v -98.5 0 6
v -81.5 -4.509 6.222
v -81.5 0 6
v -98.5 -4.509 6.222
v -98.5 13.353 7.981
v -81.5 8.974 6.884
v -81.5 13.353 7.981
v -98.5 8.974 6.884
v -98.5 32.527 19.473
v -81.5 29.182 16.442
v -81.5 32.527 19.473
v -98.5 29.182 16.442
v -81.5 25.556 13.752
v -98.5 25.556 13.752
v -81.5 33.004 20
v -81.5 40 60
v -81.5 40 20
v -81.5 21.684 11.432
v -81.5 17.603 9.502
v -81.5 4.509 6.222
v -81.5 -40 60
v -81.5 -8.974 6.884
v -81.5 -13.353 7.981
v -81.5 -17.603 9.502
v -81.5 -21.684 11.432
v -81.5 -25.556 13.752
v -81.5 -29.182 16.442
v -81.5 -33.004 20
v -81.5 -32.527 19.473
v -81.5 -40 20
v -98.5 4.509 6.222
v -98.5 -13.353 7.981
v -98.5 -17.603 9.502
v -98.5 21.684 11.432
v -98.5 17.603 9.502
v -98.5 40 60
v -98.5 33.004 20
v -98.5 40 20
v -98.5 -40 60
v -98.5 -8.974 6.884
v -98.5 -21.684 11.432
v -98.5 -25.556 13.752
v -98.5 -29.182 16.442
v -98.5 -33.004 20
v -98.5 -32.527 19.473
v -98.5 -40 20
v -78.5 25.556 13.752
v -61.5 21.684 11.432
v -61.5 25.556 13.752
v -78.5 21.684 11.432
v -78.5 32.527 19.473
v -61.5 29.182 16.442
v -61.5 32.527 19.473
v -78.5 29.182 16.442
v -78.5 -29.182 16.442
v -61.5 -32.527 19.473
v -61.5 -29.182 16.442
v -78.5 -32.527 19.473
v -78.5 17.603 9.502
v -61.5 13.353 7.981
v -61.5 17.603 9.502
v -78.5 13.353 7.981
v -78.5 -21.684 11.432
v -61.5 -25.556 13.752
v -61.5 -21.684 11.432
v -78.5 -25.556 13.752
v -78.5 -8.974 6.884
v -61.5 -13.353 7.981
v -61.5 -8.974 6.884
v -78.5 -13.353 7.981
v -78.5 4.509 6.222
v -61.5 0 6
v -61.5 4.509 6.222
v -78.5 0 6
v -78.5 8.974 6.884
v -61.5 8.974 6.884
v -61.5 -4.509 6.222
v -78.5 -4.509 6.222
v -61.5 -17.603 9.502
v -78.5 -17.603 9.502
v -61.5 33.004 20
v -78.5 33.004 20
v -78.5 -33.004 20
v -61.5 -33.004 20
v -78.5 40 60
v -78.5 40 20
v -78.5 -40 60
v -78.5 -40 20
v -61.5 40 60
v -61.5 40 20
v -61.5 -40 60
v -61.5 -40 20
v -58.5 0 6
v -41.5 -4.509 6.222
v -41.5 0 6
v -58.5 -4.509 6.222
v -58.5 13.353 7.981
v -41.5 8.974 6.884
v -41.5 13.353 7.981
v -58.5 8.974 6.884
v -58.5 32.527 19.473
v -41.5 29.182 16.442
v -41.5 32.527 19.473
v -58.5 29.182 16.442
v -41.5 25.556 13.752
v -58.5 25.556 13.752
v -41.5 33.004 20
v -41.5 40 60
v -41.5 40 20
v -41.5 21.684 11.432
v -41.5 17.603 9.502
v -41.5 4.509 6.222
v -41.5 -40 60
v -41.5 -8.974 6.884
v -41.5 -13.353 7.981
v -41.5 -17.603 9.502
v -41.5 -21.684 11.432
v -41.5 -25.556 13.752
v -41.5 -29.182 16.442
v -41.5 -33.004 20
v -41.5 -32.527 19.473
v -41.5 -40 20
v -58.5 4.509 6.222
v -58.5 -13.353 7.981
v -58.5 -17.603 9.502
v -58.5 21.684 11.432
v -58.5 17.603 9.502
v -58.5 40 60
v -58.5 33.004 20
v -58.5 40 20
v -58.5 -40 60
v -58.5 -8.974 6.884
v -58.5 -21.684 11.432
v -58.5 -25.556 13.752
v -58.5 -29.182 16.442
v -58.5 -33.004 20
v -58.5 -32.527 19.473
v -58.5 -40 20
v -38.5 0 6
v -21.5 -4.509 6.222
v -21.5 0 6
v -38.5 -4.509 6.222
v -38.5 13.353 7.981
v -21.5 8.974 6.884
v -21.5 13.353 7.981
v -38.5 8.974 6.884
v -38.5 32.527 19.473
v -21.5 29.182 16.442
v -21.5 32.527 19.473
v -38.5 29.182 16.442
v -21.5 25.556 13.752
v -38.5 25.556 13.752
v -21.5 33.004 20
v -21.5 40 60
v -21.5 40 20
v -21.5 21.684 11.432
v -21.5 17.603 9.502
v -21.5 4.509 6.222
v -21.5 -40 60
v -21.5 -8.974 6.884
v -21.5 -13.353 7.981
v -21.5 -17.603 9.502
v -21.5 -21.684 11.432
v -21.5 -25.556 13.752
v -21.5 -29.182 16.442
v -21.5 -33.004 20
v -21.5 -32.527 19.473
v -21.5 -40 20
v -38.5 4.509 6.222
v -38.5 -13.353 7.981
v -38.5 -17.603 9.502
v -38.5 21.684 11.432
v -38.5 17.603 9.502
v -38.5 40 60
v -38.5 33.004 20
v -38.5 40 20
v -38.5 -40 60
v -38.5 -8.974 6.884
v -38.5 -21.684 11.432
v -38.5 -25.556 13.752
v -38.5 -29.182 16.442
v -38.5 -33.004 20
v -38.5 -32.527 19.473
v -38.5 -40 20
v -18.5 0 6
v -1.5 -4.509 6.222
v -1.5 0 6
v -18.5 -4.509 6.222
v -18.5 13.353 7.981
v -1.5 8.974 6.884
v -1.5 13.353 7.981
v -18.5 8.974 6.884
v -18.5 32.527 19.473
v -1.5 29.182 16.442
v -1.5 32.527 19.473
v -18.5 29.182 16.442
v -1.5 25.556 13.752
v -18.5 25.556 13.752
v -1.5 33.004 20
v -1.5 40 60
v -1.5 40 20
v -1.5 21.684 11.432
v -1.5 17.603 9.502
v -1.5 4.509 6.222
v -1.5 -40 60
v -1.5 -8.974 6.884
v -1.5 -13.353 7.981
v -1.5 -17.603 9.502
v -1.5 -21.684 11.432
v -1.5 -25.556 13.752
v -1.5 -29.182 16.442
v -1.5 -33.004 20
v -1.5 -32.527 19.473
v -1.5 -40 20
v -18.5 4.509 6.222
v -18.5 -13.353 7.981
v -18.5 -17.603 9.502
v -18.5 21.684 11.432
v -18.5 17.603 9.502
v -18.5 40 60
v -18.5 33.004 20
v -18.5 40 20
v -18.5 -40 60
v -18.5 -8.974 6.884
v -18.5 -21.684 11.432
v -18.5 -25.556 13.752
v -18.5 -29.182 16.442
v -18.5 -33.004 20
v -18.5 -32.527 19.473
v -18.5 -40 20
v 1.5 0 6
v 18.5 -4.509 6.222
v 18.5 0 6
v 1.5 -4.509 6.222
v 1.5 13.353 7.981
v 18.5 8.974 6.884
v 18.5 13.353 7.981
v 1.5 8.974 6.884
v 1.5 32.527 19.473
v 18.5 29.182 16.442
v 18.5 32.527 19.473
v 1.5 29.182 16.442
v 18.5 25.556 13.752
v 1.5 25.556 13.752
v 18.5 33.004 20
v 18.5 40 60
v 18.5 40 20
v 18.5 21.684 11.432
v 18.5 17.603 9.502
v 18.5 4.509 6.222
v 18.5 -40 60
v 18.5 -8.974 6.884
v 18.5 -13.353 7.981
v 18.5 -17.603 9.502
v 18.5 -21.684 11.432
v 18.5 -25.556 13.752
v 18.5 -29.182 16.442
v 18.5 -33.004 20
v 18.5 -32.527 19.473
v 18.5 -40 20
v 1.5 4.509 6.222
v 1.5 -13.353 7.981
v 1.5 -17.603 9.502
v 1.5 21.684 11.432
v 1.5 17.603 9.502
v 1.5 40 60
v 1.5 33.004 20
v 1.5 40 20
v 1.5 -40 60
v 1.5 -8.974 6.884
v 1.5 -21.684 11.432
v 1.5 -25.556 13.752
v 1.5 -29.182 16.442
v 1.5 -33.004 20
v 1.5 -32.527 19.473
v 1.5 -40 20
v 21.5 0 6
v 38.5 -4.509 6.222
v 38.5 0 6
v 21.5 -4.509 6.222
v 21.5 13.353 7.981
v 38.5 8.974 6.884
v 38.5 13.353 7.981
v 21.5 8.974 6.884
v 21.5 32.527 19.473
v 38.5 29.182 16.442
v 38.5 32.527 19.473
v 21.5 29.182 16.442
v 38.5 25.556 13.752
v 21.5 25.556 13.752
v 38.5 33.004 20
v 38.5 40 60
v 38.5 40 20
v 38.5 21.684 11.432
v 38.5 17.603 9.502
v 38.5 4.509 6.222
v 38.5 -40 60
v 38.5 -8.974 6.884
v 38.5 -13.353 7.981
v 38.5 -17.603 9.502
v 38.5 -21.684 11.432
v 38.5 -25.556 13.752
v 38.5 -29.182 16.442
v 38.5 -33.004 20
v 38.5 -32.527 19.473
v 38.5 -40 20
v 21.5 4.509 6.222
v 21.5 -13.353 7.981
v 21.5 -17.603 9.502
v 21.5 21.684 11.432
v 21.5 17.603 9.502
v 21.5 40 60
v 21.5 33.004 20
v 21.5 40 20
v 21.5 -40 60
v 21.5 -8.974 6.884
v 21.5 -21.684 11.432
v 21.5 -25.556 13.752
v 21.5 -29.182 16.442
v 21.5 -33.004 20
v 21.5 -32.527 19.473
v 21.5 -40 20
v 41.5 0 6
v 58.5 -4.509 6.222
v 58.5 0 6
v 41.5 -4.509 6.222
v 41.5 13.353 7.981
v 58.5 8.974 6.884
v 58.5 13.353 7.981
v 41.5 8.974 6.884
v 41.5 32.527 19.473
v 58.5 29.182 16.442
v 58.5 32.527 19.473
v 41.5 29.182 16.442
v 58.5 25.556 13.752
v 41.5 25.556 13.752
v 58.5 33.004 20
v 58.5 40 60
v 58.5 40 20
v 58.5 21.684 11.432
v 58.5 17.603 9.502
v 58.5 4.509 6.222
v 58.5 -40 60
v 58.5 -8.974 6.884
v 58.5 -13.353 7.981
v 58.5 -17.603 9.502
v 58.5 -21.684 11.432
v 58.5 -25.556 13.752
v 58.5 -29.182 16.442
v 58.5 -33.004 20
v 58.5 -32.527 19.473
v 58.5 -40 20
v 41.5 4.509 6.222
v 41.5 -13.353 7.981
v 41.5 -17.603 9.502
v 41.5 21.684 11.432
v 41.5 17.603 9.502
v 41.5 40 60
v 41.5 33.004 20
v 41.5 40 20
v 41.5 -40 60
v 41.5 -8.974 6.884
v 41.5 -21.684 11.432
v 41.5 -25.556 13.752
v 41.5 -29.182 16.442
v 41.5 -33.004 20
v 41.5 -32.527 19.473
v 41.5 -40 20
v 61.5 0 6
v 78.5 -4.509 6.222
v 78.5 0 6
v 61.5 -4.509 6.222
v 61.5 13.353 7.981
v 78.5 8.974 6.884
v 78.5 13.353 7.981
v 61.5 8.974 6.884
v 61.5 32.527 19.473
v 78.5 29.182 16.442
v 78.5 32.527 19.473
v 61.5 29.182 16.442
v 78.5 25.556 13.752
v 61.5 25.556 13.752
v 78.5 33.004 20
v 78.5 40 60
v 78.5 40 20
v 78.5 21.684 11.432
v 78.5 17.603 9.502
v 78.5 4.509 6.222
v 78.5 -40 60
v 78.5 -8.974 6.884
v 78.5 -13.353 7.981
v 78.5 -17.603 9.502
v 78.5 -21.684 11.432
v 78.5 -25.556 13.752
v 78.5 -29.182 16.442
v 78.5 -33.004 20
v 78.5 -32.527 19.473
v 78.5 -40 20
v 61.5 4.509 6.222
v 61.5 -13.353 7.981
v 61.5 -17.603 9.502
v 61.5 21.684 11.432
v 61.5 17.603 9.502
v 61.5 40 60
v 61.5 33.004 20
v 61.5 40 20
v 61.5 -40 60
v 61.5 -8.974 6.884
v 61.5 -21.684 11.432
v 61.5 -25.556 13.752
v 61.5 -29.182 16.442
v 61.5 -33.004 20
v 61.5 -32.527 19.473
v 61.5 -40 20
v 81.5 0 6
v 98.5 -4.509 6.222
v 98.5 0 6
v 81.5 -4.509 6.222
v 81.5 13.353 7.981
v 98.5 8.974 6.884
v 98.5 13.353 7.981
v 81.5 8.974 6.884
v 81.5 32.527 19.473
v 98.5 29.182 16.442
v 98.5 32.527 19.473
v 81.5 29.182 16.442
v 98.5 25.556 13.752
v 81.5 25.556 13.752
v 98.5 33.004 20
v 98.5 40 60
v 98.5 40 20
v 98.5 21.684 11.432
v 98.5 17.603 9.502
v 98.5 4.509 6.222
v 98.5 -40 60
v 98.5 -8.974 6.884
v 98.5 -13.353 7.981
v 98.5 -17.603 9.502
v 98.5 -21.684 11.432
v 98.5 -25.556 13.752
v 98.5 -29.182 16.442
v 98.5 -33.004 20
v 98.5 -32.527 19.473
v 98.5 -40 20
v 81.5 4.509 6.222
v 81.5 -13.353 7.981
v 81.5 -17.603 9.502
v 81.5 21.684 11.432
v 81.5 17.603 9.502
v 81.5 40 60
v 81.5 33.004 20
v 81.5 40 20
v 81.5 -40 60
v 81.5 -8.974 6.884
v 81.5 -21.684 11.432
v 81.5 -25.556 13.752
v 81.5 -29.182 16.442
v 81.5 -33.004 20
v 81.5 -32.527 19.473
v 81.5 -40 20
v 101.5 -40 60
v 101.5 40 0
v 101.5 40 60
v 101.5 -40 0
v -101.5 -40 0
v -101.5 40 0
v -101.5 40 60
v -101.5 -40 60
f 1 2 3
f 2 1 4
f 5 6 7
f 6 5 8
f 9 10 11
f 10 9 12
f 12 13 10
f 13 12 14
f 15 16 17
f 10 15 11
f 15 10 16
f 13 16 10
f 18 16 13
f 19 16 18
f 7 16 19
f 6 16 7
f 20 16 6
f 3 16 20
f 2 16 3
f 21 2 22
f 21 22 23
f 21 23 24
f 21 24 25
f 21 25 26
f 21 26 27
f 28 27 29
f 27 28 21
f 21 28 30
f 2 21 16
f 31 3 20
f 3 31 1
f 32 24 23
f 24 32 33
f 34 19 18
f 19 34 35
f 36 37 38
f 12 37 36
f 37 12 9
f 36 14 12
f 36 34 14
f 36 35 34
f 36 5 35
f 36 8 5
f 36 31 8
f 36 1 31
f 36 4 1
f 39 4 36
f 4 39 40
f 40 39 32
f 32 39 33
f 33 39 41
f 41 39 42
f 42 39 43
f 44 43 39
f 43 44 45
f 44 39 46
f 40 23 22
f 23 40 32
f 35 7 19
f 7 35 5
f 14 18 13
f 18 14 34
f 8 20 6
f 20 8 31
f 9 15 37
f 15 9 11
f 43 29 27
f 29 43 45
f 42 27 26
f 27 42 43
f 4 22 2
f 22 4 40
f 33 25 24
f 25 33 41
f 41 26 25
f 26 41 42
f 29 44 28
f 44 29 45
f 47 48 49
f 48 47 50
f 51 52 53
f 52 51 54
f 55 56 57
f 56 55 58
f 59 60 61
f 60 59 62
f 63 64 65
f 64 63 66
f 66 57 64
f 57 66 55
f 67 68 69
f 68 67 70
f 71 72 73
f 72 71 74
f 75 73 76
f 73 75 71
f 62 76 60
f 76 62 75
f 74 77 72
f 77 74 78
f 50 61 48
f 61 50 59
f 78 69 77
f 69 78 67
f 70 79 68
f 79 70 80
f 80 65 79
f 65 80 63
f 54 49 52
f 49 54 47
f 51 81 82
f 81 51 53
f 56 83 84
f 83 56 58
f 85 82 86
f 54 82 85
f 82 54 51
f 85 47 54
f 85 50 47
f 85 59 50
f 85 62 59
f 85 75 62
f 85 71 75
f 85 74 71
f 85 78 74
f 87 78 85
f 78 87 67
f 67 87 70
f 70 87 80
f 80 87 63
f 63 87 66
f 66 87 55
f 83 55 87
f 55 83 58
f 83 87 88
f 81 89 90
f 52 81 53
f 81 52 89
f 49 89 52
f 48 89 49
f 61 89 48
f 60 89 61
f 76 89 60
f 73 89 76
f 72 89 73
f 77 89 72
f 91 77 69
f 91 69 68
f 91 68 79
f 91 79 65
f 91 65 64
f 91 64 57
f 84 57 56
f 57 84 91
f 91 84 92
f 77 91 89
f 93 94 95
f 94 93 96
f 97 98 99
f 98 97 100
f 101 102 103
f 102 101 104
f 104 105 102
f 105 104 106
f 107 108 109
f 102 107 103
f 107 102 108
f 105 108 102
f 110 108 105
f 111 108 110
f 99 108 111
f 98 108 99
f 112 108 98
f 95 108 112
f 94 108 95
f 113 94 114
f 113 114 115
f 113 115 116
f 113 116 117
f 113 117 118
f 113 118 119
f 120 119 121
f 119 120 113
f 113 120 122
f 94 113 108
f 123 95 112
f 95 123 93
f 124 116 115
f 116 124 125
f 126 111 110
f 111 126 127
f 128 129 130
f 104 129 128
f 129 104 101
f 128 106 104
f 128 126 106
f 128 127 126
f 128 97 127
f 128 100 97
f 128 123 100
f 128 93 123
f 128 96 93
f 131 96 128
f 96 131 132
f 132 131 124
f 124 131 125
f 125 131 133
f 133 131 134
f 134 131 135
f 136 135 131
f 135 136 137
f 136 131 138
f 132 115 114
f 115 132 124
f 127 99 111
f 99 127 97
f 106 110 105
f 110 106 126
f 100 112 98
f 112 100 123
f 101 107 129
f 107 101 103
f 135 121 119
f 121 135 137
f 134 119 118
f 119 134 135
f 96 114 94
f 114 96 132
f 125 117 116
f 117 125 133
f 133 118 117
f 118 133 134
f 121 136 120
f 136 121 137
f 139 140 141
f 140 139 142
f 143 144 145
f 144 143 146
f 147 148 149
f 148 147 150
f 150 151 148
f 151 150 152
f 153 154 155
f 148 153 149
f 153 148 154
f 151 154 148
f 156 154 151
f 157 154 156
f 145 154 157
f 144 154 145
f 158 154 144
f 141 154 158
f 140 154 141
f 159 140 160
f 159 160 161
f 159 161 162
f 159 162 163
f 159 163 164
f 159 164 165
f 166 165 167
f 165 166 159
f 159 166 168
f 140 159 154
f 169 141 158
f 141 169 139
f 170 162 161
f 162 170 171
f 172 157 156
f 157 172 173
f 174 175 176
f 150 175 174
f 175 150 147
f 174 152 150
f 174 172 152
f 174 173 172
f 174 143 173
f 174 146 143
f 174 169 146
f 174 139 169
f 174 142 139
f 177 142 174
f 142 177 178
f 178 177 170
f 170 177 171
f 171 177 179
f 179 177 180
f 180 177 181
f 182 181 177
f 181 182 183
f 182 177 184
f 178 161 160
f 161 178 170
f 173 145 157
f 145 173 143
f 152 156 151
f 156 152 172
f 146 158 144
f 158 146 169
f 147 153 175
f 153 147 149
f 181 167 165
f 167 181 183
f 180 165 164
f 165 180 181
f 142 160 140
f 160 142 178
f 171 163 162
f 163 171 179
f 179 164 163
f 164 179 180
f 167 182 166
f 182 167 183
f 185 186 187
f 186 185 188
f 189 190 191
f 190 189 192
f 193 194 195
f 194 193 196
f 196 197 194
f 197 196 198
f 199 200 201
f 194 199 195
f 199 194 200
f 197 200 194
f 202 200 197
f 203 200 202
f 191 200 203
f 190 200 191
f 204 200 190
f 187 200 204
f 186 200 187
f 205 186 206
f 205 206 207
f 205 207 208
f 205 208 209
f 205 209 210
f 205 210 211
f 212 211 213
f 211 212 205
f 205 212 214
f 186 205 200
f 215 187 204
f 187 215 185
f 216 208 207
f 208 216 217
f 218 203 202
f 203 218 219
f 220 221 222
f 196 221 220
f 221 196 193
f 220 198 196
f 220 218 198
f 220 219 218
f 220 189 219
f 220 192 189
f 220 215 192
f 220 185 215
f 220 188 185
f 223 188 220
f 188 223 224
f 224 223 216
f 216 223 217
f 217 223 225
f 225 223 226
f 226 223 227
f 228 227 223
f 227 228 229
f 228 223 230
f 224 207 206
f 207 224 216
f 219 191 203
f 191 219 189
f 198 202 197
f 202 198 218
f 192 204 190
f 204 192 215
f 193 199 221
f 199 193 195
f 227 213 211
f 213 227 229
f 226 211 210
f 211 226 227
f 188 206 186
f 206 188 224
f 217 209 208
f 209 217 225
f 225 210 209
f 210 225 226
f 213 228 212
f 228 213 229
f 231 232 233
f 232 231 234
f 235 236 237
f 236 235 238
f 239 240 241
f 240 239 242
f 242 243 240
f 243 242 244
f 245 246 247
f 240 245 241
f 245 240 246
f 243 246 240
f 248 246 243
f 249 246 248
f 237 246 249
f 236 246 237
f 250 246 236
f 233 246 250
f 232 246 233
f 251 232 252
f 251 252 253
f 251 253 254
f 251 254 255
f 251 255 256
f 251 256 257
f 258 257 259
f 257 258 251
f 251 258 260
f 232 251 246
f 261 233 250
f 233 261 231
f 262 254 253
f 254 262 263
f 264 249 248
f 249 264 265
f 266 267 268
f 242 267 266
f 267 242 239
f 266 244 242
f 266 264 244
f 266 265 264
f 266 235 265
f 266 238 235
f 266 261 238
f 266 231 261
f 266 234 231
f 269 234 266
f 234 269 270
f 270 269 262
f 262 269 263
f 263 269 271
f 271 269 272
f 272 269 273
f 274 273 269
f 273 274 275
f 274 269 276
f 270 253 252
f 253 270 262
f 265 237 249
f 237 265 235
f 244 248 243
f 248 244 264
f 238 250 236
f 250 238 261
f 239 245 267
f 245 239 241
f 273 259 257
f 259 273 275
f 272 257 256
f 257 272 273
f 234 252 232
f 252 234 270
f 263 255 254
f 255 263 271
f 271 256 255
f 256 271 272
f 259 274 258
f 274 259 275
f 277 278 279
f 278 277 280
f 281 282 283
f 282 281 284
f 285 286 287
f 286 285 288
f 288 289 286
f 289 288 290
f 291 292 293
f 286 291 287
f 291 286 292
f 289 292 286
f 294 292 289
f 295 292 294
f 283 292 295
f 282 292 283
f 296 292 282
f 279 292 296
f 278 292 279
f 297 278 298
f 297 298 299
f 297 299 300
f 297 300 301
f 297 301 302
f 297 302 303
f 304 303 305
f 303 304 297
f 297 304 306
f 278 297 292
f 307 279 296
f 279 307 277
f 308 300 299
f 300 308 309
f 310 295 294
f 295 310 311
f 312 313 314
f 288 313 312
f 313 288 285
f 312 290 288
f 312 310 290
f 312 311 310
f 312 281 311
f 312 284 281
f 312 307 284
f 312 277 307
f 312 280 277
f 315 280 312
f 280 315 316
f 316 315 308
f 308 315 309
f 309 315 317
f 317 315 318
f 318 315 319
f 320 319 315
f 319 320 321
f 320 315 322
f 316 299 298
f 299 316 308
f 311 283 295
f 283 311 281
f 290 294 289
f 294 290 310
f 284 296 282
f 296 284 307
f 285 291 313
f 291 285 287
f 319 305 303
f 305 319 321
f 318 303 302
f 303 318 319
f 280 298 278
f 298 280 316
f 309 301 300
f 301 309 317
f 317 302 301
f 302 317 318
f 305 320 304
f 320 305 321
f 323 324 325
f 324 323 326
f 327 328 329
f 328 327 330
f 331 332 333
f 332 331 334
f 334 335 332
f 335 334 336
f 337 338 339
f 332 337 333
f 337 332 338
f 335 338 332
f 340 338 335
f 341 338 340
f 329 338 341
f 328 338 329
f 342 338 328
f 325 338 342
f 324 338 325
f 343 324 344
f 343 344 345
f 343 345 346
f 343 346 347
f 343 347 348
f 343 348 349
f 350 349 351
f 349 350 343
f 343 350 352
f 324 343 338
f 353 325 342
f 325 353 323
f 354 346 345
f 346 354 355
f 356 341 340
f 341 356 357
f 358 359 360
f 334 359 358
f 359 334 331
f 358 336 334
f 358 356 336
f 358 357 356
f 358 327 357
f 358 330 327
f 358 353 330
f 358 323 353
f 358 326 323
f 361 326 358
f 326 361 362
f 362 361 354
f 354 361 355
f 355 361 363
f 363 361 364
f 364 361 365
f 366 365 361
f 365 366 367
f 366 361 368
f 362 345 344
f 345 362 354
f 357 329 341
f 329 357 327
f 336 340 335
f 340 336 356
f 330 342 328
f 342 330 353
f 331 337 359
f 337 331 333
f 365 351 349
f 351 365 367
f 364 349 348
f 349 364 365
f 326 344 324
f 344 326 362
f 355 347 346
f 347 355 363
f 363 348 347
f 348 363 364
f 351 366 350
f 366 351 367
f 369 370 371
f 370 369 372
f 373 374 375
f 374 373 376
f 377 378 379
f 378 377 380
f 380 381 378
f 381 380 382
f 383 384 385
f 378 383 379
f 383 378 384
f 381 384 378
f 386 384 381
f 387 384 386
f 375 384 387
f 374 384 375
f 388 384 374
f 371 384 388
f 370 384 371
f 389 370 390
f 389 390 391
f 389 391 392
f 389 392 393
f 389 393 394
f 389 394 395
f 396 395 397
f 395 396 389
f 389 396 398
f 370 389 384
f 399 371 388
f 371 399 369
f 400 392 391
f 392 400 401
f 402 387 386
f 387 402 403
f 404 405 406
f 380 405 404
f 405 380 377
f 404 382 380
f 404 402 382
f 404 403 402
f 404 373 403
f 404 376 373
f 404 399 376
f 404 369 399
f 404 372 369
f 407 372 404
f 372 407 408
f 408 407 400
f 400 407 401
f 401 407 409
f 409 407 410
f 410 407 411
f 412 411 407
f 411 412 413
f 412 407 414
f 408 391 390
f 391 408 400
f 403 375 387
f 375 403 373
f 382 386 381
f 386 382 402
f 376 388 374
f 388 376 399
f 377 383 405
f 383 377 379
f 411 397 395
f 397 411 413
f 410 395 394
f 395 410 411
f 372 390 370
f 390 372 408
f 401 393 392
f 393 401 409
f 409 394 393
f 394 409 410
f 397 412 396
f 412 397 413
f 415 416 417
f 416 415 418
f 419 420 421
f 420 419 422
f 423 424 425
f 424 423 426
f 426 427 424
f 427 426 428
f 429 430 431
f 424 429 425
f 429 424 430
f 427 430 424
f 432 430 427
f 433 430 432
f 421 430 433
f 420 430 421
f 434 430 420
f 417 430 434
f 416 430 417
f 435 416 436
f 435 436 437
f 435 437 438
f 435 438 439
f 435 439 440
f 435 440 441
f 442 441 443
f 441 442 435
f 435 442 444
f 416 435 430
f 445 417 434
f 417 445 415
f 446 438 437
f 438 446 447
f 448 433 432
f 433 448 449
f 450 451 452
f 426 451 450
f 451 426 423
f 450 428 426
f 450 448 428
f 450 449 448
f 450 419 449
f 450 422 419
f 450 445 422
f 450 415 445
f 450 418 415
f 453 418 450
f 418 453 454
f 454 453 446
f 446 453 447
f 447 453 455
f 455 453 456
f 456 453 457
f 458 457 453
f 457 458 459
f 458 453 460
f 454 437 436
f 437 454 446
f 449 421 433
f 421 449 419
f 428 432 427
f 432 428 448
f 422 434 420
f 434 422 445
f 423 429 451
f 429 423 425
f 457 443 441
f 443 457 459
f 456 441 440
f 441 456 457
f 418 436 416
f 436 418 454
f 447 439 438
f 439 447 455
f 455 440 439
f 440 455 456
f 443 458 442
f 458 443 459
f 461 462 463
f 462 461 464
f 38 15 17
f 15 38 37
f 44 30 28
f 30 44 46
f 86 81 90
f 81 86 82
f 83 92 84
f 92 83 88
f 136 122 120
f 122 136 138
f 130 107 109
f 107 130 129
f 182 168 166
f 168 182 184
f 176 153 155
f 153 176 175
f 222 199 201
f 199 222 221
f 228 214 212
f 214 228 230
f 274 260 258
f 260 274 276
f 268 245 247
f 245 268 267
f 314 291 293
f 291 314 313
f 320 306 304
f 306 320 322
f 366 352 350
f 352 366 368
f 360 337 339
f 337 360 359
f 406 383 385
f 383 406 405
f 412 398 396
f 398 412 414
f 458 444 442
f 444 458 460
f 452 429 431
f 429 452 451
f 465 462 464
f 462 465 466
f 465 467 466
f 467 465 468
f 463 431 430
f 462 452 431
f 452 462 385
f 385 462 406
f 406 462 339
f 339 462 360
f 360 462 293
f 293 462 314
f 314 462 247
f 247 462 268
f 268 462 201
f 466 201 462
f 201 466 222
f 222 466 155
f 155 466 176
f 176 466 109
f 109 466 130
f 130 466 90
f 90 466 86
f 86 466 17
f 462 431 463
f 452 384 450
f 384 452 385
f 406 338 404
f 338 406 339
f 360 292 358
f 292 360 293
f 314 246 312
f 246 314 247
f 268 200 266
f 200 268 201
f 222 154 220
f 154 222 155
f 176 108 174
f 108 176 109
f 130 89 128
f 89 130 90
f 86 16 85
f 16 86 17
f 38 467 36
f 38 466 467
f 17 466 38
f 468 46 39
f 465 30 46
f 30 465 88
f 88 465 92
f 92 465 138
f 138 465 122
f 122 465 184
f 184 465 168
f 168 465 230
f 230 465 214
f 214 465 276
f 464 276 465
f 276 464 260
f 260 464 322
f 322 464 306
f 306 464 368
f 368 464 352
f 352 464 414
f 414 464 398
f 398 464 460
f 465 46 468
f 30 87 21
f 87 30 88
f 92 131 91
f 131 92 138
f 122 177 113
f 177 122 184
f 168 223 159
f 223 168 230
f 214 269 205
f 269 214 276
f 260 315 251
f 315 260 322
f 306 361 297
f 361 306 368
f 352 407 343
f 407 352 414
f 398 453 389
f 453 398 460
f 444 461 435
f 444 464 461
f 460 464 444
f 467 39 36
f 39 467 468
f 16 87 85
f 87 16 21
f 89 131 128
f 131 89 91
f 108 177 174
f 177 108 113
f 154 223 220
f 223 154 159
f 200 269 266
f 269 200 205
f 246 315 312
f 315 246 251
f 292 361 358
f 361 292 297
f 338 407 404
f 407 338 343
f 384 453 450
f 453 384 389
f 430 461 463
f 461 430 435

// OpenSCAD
// Dimensions in millimeters
base_length_x = 203;   // X length
base_width_y = 80;     // Y width
base_height_z = 20;    // Z height

cradle_radius = 46;    // Radius of cylindrical cradle
cradle_axis_y = 0;     // Y position of cylinder axis
cradle_axis_z = 52;    // Z position of cylinder axis

divider_thickness_x = 3;    // Thickness of divider in X
divider_width_y = 80;       // Width of divider in Y
divider_height_z = 60;      // Height of divider in Z
divider_spacing = 20;       // Center-to-center spacing of dividers

slot_width = 17;            // Width of each slot between dividers

// Resolution for smooth curved surfaces
$fn = 64;

// Main assembly
union() {
    // Base with cradle cuts in slots only
    difference() {
        // Base block, positioned from z=0 to z=20, centered in X and Y
        translate([0, 0, base_height_z / 2]) {
            cube([base_length_x, base_width_y, base_height_z], center = true);
        }
        
        // Cut cradle in each of the 10 slots
        for (i = [0 : 9]) {
            // Slot i is between divider i and divider i+1
            divider_left_x = -100 + i * divider_spacing;
            divider_right_x = -100 + (i + 1) * divider_spacing;
            slot_center_x = (divider_left_x + divider_right_x) / 2;
            
            // Cylinder aligned along X, centered at y=0, z=52
            translate([slot_center_x, cradle_axis_y, cradle_axis_z]) {
                rotate([0, 90, 0]) {
                    // Cylinder extends along X within the slot width
                    cylinder(r = cradle_radius, h = slot_width, center = true, $fn = 64);
                }
            }
        }
    }
    
    // 11 divider plates at x = -100, -80, -60, ..., 80, 100
    for (i = [0 : 10]) {
        divider_x = -100 + i * divider_spacing;
        
        // Position divider from z=0 to z=60
        translate([divider_x, 0, divider_height_z / 2]) {
            cube([divider_thickness_x, divider_width_y, divider_height_z], center = true);
        }
    }
}
